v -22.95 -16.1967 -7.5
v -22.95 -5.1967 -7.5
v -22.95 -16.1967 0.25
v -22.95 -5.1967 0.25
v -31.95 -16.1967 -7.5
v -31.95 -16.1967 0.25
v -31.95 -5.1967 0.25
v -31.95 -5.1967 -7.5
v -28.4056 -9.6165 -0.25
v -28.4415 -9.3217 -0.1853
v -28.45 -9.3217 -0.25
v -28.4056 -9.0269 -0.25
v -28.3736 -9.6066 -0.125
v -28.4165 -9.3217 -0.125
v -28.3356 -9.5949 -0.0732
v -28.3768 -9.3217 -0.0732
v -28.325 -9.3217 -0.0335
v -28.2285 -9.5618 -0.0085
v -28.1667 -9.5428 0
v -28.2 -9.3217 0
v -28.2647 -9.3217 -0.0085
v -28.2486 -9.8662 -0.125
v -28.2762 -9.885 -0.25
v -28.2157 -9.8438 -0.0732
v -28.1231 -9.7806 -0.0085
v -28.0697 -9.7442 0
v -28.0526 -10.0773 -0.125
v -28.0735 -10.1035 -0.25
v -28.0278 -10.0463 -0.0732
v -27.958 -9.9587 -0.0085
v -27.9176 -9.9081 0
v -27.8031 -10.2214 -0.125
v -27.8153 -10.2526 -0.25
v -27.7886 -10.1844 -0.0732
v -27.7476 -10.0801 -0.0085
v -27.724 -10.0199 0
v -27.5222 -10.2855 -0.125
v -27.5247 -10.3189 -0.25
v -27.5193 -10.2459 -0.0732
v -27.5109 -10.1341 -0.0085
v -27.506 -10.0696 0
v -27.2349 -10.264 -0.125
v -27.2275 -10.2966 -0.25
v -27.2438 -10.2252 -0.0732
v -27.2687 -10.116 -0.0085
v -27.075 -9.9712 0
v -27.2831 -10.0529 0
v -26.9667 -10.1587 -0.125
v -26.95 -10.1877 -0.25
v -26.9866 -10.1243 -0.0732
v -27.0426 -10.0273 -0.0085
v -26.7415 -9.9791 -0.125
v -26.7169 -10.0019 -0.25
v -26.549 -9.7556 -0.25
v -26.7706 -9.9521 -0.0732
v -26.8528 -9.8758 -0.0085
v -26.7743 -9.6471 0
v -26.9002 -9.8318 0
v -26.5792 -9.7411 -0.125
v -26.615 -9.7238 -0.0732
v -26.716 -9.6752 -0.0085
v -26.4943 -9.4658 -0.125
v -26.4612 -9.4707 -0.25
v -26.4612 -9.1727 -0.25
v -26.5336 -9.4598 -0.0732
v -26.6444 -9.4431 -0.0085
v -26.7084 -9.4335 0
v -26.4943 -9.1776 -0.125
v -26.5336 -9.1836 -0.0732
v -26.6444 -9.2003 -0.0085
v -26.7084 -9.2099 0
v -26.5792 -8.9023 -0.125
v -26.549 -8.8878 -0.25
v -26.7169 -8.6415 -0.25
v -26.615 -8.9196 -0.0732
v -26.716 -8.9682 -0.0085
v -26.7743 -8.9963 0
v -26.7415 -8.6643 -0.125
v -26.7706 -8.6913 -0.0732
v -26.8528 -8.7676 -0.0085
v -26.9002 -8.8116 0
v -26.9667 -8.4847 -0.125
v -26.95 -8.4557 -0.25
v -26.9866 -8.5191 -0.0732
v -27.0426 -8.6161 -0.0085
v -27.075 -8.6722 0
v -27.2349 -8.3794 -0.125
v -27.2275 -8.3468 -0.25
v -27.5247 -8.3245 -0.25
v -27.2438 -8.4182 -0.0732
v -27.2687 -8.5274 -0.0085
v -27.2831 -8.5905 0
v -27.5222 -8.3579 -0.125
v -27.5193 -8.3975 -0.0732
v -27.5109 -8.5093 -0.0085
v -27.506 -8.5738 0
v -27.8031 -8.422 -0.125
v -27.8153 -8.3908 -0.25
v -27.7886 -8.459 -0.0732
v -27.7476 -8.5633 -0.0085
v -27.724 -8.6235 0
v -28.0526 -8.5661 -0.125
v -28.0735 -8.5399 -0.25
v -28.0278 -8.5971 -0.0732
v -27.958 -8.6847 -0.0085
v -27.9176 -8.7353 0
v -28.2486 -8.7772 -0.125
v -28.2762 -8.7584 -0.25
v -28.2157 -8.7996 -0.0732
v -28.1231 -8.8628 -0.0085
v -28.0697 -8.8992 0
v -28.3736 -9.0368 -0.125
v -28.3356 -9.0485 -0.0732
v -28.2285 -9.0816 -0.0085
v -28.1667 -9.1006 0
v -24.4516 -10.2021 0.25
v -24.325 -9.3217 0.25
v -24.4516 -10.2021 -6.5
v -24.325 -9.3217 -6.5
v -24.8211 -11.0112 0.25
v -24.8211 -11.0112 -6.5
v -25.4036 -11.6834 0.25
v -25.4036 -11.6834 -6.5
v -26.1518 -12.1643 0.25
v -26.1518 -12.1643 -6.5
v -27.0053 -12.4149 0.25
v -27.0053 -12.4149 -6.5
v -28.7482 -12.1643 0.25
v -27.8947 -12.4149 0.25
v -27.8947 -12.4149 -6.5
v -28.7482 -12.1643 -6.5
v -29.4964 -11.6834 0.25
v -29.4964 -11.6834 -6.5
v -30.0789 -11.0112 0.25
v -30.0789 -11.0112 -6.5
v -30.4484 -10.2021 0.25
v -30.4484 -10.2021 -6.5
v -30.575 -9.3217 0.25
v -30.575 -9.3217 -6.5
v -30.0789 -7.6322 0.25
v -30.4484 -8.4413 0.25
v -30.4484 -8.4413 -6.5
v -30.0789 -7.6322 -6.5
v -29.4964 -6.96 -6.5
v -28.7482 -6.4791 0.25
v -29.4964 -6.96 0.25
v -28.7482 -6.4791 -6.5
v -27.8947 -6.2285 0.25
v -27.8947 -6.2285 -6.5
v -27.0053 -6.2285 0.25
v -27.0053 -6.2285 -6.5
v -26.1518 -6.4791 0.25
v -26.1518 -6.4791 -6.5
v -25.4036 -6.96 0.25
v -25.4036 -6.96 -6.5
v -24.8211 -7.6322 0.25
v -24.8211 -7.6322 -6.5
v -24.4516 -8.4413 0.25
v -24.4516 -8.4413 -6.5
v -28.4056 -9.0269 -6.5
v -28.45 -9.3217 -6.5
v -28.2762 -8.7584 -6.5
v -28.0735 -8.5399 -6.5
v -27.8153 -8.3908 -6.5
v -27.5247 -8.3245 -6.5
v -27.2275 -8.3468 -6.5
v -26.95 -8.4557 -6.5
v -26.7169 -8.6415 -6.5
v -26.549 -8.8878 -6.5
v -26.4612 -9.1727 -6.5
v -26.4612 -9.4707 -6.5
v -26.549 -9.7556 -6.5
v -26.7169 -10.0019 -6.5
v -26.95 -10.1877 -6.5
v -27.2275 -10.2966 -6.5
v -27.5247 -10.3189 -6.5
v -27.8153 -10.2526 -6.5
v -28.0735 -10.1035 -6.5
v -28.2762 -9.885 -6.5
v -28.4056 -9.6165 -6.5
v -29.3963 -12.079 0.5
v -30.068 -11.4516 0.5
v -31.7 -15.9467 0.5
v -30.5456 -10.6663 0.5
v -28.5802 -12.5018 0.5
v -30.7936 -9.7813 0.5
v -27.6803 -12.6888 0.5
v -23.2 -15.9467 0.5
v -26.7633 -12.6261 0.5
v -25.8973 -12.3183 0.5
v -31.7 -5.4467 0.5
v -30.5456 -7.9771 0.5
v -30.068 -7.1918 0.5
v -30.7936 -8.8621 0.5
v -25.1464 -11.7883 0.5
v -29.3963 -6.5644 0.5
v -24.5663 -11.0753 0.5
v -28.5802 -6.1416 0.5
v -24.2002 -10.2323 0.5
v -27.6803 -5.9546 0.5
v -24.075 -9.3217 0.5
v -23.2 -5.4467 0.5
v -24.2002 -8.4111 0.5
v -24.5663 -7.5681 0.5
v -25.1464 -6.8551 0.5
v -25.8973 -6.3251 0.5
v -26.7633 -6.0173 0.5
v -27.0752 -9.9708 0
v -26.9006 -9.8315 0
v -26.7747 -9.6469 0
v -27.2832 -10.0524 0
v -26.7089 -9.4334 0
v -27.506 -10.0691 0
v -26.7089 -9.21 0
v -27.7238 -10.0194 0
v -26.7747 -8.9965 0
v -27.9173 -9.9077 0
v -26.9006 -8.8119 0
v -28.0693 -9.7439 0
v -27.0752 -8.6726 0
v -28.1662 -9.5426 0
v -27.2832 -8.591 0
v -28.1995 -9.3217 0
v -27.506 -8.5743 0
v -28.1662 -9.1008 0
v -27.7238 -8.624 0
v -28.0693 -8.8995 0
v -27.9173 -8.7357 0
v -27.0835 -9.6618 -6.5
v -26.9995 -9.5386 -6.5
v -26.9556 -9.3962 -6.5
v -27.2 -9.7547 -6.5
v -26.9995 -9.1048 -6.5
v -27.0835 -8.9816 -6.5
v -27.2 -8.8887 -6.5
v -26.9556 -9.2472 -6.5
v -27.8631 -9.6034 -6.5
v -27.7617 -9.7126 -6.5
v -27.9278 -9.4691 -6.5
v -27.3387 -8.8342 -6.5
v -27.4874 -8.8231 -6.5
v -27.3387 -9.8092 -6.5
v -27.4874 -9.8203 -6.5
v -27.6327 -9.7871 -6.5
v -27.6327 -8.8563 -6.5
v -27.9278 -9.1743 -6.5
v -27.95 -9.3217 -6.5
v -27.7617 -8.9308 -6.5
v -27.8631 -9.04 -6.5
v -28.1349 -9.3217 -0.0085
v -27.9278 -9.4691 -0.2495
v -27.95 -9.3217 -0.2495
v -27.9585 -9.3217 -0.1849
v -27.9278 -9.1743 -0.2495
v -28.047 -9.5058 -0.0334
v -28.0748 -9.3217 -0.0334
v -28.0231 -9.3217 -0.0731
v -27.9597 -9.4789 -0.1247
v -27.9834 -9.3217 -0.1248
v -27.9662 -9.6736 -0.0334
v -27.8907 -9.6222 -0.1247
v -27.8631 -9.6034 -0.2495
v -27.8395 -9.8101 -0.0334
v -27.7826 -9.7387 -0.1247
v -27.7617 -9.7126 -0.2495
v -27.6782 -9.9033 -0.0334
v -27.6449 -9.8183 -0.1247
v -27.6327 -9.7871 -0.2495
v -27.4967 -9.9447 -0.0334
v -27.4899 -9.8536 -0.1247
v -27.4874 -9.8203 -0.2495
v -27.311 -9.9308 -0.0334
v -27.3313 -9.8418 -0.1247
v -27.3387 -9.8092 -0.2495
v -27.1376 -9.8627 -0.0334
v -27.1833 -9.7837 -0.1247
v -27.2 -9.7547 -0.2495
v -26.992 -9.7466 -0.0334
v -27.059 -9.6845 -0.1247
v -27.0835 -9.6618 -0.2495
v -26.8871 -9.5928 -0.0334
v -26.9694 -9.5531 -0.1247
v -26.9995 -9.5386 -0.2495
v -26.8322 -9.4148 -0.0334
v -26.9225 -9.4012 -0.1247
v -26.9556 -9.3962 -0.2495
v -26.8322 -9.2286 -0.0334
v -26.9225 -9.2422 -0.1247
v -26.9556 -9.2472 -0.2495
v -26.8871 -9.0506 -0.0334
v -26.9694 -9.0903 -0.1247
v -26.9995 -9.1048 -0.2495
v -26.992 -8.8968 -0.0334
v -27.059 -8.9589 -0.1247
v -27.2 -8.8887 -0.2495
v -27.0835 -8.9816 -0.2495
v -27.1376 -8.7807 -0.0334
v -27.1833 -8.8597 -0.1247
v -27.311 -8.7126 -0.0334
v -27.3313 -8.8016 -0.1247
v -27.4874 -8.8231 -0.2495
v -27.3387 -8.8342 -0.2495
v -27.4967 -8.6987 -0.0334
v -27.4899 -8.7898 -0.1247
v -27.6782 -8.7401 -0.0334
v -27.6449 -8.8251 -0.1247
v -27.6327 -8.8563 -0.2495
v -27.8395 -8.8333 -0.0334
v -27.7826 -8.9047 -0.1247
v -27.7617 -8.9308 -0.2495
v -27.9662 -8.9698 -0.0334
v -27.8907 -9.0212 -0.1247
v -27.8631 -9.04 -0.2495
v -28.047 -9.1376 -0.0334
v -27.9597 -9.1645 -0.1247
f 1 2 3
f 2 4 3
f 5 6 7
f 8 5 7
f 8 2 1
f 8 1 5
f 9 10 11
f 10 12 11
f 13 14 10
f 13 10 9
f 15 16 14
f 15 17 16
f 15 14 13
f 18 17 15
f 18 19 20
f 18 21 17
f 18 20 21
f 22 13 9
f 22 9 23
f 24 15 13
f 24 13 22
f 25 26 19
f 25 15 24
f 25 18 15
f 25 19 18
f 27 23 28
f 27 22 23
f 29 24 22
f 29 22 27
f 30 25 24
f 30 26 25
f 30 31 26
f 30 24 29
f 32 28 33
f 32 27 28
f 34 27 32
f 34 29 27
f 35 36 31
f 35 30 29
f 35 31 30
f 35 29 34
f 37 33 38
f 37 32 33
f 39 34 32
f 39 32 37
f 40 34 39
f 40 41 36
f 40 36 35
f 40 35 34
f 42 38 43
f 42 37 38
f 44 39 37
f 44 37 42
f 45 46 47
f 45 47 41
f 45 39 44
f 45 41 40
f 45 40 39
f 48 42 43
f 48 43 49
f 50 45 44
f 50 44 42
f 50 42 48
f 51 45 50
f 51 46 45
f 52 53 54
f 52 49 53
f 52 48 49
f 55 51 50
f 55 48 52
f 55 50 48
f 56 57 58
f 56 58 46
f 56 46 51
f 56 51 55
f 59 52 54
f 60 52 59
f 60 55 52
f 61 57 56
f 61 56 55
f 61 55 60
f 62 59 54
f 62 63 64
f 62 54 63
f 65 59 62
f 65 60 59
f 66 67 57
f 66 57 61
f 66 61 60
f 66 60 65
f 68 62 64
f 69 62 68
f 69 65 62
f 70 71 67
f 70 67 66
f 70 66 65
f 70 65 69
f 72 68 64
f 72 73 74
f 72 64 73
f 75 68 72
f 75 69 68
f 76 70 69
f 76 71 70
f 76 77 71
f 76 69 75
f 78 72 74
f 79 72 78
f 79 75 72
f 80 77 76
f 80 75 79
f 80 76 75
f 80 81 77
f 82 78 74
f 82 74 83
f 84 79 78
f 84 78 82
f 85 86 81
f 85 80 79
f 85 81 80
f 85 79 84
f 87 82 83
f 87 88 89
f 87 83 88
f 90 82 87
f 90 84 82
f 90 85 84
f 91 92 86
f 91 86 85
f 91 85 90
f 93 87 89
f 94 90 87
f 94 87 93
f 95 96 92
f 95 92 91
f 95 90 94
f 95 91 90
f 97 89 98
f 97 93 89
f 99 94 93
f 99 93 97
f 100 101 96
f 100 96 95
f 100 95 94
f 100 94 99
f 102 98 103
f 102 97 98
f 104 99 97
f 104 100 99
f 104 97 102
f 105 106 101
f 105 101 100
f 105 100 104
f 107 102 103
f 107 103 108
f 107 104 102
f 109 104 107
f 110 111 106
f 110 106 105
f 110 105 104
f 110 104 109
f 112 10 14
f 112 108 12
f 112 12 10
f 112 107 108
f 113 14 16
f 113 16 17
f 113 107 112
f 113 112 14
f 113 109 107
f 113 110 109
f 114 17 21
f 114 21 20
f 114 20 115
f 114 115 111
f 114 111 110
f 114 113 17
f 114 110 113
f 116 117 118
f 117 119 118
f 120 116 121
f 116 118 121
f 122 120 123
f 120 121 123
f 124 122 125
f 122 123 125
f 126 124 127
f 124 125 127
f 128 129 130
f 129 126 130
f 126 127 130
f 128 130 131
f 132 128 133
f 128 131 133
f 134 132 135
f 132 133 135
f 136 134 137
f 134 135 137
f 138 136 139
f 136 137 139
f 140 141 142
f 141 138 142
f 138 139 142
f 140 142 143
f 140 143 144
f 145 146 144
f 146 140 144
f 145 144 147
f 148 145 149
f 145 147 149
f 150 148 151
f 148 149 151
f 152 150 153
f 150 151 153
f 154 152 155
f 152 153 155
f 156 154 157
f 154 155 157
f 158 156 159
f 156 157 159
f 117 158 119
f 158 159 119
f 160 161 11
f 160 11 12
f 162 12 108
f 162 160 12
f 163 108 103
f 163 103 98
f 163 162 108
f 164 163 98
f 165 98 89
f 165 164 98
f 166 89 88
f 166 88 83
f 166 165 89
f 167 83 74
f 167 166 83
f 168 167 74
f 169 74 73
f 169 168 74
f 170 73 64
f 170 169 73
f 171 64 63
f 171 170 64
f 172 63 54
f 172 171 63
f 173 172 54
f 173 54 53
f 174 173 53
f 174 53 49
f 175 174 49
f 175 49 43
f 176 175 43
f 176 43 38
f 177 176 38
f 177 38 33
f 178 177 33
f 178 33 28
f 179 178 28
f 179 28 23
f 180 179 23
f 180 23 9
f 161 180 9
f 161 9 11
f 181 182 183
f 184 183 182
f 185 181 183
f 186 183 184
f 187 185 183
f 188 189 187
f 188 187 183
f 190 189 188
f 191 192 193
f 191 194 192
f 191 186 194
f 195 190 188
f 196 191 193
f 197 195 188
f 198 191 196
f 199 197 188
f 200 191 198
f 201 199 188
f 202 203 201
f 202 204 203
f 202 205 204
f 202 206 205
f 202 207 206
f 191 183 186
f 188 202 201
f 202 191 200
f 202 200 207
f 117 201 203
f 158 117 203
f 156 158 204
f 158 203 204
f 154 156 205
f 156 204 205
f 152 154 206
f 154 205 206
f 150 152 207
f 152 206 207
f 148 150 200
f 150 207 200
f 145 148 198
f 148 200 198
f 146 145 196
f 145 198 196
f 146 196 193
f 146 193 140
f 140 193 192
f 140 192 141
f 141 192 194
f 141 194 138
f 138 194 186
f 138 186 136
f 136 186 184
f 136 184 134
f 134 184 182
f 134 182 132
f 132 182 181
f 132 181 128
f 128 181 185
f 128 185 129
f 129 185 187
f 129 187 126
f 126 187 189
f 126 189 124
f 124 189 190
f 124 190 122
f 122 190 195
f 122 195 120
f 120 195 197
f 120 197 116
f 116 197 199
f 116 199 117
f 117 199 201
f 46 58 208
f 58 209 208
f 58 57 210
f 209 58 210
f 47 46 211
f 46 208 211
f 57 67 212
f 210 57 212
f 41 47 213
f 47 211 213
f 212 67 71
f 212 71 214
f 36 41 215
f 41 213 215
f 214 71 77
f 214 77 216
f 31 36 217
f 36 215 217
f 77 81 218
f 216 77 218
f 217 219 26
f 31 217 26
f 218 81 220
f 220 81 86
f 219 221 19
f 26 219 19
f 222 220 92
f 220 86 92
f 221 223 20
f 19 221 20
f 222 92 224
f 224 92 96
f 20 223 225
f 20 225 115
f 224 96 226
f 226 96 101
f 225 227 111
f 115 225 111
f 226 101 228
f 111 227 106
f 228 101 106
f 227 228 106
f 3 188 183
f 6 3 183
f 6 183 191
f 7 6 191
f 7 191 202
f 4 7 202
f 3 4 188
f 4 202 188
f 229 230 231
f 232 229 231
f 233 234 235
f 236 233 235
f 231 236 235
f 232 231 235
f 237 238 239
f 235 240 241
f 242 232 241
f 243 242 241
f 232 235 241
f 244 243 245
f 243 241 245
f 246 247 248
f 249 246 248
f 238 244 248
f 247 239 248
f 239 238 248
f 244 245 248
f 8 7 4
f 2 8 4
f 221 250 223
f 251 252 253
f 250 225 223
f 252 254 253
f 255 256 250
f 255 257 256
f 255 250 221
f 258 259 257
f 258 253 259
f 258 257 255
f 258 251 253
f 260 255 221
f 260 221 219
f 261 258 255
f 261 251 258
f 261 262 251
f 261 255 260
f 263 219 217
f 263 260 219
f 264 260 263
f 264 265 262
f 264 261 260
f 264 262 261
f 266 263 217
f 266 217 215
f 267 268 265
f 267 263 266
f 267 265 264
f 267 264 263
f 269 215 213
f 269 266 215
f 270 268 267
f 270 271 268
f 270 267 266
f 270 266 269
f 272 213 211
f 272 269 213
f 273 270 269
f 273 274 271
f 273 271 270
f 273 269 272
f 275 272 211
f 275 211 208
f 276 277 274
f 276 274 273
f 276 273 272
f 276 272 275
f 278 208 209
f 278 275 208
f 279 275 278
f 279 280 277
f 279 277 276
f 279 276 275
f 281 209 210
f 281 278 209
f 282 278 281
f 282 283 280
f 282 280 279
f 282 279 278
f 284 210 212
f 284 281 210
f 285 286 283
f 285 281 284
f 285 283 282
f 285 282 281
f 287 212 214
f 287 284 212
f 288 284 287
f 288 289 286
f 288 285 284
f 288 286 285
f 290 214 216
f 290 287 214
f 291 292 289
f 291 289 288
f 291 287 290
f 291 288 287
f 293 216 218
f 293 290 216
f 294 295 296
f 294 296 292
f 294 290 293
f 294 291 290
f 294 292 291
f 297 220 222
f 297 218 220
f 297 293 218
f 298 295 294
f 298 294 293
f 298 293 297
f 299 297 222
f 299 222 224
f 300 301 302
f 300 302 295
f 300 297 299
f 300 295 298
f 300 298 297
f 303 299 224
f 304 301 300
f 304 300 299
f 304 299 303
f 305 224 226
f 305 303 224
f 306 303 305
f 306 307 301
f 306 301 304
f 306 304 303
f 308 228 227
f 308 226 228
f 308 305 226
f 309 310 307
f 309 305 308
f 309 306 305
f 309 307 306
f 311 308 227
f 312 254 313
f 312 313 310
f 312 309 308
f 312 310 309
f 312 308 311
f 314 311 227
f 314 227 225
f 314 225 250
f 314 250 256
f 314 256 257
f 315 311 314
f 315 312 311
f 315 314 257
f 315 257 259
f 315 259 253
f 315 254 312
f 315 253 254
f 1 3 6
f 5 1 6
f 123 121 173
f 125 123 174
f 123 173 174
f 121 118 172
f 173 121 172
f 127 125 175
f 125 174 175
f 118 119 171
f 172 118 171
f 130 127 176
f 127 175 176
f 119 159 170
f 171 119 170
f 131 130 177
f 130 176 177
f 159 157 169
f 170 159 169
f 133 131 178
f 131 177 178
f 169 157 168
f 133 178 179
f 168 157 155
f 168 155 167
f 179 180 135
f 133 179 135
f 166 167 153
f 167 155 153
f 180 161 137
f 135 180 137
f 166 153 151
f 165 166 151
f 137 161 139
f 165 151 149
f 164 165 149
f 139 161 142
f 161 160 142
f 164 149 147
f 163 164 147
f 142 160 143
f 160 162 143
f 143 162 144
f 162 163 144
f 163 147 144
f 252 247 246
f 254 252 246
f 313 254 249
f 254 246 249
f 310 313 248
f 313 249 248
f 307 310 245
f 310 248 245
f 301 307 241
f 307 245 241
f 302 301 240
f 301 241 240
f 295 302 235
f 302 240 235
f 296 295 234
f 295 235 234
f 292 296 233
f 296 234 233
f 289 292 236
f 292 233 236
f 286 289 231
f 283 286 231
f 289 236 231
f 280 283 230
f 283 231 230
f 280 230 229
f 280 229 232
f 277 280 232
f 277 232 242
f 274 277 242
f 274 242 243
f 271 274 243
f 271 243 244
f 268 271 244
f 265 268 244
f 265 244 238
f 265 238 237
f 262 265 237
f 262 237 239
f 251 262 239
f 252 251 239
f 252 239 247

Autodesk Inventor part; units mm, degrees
ref_plane "YZ Plane" through (0, 0, 0) normal (1, 0, 0) x (0, 1, 0)
ref_plane "XZ Plane" through (0, 0, 0) normal (0, 1, 0) x (-1, 0, 0)
ref_plane "XY Plane" through (0, 0, 0) normal (0, 0, 1) x (1, 0, 0)
ref_plane "Płaszczyzna konstrukcyjna1" through (0, 0, 0) normal (0, 0, 1) x (1, 0, 0)
sketch "Szkic1" plane through (0, 0, 0) normal (0, 0, 1) x (1, 0, 0)
  line L0 (-32.2, -16.4467) -> (-32.2, -4.9467) projected
  line L1 (-32.2, -4.9467) -> (-22.7, -4.9467) projected
  line L2 (-22.7, -4.9467) -> (-22.7, -16.4467) projected
  line L3 (-22.7, -16.4467) -> (-32.2, -16.4467) projected
  line L4 (-31.95, -5.1967) -> (-22.95, -5.1967)
  line L5 (-22.95, -5.1967) -> (-22.95, -16.1967)
  line L6 (-22.95, -16.1967) -> (-31.95, -16.1967)
  line L7 (-31.95, -16.1967) -> (-31.95, -5.1967)
  circle A0 centre (-27.45, -9.3217) radius 3.125
  point P0 (0, 0)
  dimension "d0" = 9
  dimension "d1" = 11
  dimension "d2" = 6.25
extrude "Wyciągnięcie proste1" add sketch "Szkic1" against normal blind 6.5 and the other way blind 0.5 contours L4 L5 L6 L7
chamfer "Faza1" distance 0.25 angle 45 5 edges at (-27.45, -5.1967, 0.5) (-22.95, -10.6967, 0.5) (-31.95, -10.6967, 0.5) (-27.45, -16.1967, 0.5) (-30.575, -9.3217, 0.5)
sketch "Szkic2" plane through (0, 0, -6.5) normal (0, 0, -1) x (-1, 0, 0)
  circle A0 centre (27.45, -9.3217) radius 1
  circle A1 centre (27.45, -9.3217) radius 0.5
  point P0 (0, 0)
  dimension "d11" = 2
  dimension "d12" = 1
extrude "Wyciągnięcie proste2" add sketch "Szkic2" against normal blind 6.5
fillet "Zaokrąglenie1" radius 0.25 1 edges at (-26.45, -9.3217, 0)
fillet "Zaokrąglenie2" radius 0.25 1 edges at (-26.95, -9.3217, 0)
sketch "Szkic3" plane through (0, 0, -6.5) normal (0, 0, -1) x (-1, 0, 0)
  line L0 (31.95, -5.1967) -> (22.95, -5.1967) projected
  line L1 (22.95, -5.1967) -> (22.95, -16.1967) projected
  line L2 (22.95, -16.1967) -> (31.95, -16.1967) projected
  line L3 (31.95, -16.1967) -> (31.95, -5.1967) projected
  point P0 (0, 0)
extrude "Wyciągnięcie proste3" add sketch "Szkic3" along normal blind 1
properties part number "AUDIO DC12" material "Tworzywo sztuczne, nieprzezroczyste czarne"
